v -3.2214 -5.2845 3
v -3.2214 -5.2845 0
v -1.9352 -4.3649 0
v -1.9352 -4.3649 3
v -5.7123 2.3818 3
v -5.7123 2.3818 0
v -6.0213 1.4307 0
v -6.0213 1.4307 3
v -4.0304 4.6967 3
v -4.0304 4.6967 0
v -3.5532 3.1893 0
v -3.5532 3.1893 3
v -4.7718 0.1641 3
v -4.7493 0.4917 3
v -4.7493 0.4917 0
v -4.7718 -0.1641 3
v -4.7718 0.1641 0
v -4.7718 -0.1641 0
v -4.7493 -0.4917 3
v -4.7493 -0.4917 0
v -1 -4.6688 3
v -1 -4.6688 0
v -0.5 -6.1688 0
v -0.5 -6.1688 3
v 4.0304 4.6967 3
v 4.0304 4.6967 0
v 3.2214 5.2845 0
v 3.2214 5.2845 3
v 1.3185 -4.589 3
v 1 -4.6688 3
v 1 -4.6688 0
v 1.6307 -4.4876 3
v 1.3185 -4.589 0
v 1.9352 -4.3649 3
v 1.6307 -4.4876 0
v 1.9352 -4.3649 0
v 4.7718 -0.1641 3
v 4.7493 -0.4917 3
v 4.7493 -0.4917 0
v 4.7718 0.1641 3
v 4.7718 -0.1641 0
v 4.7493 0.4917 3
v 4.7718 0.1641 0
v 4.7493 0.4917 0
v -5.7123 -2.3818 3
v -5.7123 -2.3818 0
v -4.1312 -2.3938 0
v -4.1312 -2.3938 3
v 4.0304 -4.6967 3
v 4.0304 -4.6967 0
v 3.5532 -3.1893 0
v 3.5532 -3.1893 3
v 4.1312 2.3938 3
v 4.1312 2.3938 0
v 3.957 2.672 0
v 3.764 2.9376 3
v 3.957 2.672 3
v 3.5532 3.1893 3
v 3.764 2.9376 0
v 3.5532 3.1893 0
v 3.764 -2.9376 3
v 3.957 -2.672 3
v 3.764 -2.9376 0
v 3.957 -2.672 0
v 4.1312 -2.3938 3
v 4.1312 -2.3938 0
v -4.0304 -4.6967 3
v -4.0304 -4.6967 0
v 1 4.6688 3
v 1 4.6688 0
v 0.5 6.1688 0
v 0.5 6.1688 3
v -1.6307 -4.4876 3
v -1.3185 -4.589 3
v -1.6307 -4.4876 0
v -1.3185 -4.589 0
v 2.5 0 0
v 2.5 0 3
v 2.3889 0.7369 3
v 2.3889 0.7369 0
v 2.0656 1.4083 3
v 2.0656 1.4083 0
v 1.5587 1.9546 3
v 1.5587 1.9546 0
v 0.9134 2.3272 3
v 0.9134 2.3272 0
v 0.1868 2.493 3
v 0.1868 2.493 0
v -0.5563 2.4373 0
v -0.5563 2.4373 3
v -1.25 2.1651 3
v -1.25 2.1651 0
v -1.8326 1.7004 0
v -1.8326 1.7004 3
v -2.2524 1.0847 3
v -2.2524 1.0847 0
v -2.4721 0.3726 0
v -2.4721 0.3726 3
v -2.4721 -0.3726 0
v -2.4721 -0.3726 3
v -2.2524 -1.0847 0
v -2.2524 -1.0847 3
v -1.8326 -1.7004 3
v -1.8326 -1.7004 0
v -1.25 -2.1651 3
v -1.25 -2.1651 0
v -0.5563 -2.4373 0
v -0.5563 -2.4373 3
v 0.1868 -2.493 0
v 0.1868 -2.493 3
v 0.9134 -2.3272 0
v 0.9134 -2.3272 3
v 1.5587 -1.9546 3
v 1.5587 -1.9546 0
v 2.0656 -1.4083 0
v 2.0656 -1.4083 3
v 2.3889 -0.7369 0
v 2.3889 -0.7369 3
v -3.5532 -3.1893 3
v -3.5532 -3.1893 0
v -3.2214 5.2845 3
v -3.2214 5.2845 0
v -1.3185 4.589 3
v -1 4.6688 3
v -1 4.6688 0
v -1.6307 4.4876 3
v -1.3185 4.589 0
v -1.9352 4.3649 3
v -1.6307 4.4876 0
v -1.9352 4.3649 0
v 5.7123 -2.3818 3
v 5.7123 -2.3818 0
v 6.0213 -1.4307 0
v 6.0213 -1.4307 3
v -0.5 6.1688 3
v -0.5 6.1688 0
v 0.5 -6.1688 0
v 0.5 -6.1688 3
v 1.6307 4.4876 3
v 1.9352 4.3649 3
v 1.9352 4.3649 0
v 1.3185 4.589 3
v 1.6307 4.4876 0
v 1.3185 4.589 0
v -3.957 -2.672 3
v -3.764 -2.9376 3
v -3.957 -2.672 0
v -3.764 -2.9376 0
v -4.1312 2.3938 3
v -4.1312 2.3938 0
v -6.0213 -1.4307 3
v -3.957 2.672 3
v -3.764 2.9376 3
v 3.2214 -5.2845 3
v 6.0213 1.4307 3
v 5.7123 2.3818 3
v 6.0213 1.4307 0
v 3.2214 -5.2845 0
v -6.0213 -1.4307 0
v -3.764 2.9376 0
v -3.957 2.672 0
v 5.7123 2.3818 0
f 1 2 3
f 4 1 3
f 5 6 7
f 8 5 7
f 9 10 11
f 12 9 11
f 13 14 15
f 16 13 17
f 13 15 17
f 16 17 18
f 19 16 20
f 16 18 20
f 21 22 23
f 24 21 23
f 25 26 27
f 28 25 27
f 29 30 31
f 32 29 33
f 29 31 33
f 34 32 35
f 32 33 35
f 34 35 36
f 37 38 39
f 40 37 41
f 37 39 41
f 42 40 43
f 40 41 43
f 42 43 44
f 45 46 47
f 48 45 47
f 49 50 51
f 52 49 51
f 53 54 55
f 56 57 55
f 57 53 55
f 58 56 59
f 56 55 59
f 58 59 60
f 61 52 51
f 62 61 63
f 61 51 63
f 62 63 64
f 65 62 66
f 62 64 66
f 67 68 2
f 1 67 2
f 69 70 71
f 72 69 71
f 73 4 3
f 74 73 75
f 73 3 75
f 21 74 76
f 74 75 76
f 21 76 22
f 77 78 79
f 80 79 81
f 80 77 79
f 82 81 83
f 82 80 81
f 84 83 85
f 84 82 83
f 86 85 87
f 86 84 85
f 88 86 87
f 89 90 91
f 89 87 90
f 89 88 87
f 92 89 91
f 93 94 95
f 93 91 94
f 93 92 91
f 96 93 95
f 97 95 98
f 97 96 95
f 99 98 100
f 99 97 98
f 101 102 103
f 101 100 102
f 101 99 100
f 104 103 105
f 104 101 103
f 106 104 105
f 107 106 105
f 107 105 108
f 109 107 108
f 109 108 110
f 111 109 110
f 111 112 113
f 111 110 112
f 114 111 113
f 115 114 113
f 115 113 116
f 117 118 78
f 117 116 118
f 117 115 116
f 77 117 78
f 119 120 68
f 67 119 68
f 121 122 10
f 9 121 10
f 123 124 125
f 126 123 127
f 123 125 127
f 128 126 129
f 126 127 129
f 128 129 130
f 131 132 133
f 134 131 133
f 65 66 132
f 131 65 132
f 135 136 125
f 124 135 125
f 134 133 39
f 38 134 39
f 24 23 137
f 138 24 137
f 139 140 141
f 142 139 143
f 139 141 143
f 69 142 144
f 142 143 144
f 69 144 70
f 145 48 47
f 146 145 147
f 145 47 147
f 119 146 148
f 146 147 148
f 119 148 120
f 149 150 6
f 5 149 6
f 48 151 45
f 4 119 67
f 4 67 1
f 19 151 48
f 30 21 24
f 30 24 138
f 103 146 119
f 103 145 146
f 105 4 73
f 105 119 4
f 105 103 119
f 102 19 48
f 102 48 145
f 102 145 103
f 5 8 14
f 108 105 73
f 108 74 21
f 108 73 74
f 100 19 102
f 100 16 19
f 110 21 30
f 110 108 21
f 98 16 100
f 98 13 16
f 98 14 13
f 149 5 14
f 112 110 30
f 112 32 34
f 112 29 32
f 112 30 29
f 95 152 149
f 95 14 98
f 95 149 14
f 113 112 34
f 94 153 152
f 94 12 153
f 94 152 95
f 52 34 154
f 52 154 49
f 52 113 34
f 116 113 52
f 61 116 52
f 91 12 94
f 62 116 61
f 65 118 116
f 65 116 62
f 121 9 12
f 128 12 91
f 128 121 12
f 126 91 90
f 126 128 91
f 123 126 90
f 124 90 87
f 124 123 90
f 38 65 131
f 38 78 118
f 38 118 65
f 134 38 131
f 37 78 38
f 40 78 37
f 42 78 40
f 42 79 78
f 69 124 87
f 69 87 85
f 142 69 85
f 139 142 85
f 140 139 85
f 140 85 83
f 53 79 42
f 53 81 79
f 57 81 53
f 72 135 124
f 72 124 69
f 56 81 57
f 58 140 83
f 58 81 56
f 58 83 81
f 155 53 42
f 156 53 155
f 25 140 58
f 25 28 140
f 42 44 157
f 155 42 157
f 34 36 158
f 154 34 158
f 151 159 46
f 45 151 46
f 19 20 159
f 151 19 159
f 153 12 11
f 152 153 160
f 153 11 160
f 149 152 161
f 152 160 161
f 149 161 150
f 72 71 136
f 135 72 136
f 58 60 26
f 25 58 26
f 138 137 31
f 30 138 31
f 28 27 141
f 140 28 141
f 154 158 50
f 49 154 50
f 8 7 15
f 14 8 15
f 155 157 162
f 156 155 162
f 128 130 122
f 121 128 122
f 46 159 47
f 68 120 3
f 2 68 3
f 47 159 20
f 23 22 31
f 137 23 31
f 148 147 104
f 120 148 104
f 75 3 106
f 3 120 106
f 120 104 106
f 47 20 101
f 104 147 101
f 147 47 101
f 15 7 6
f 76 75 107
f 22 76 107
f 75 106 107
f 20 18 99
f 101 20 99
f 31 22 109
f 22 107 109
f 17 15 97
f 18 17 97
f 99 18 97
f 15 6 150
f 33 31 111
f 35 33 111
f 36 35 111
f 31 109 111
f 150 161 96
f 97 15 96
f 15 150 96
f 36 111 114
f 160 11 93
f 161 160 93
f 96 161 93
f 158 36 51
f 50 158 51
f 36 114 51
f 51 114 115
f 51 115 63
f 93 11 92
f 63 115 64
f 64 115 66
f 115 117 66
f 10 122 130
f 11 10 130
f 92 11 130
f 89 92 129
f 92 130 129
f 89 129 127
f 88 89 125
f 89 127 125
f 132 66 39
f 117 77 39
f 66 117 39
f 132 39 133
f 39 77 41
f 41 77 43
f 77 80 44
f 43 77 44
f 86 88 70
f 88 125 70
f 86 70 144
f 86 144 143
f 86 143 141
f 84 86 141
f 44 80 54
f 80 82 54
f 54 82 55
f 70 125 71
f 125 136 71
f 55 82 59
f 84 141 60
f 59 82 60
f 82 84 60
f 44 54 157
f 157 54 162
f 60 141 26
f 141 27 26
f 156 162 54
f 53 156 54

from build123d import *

# Parameters (mm, degrees)
F0_R     = 4.7746482928
F0_R_2   = 2.5
F2_DEPTH = 3
F3_COUNT = 10
F3_ANGLE = 324


with BuildPart() as f2:
    # F0 (on Top) + F1 (on face) → F2 (new body)
    with BuildSketch(Plane.XY):
        Circle(F0_R)
        Circle(F0_R_2, mode=Mode.SUBTRACT)
    with BuildSketch(Plane.XY):
        with BuildLine():
            ThreePointArc((-1, 4.6687542578), (0, 4.7746482928), (1, 4.6687542578))
            Line((1, 4.6687542578), (0.5, 6.1687542578))
            Line((0.5, 6.1687542578), (-0.5, 6.1687542578))
            Line((-0.5, 6.1687542578), (-1, 4.6687542578))
        make_face()
    extrude(amount=F2_DEPTH)

    # F3: F2 ×10 about axis
    f3_axis = Axis((0, 0, 3), (0, 0, -1))


with BuildPart() as f2_1:
    add(f2.part)
    for i in range(1, F3_COUNT):
        add(f2.part.rotate(f3_axis, i * F3_ANGLE / (F3_COUNT - 1)))


solid = f2_1.part
